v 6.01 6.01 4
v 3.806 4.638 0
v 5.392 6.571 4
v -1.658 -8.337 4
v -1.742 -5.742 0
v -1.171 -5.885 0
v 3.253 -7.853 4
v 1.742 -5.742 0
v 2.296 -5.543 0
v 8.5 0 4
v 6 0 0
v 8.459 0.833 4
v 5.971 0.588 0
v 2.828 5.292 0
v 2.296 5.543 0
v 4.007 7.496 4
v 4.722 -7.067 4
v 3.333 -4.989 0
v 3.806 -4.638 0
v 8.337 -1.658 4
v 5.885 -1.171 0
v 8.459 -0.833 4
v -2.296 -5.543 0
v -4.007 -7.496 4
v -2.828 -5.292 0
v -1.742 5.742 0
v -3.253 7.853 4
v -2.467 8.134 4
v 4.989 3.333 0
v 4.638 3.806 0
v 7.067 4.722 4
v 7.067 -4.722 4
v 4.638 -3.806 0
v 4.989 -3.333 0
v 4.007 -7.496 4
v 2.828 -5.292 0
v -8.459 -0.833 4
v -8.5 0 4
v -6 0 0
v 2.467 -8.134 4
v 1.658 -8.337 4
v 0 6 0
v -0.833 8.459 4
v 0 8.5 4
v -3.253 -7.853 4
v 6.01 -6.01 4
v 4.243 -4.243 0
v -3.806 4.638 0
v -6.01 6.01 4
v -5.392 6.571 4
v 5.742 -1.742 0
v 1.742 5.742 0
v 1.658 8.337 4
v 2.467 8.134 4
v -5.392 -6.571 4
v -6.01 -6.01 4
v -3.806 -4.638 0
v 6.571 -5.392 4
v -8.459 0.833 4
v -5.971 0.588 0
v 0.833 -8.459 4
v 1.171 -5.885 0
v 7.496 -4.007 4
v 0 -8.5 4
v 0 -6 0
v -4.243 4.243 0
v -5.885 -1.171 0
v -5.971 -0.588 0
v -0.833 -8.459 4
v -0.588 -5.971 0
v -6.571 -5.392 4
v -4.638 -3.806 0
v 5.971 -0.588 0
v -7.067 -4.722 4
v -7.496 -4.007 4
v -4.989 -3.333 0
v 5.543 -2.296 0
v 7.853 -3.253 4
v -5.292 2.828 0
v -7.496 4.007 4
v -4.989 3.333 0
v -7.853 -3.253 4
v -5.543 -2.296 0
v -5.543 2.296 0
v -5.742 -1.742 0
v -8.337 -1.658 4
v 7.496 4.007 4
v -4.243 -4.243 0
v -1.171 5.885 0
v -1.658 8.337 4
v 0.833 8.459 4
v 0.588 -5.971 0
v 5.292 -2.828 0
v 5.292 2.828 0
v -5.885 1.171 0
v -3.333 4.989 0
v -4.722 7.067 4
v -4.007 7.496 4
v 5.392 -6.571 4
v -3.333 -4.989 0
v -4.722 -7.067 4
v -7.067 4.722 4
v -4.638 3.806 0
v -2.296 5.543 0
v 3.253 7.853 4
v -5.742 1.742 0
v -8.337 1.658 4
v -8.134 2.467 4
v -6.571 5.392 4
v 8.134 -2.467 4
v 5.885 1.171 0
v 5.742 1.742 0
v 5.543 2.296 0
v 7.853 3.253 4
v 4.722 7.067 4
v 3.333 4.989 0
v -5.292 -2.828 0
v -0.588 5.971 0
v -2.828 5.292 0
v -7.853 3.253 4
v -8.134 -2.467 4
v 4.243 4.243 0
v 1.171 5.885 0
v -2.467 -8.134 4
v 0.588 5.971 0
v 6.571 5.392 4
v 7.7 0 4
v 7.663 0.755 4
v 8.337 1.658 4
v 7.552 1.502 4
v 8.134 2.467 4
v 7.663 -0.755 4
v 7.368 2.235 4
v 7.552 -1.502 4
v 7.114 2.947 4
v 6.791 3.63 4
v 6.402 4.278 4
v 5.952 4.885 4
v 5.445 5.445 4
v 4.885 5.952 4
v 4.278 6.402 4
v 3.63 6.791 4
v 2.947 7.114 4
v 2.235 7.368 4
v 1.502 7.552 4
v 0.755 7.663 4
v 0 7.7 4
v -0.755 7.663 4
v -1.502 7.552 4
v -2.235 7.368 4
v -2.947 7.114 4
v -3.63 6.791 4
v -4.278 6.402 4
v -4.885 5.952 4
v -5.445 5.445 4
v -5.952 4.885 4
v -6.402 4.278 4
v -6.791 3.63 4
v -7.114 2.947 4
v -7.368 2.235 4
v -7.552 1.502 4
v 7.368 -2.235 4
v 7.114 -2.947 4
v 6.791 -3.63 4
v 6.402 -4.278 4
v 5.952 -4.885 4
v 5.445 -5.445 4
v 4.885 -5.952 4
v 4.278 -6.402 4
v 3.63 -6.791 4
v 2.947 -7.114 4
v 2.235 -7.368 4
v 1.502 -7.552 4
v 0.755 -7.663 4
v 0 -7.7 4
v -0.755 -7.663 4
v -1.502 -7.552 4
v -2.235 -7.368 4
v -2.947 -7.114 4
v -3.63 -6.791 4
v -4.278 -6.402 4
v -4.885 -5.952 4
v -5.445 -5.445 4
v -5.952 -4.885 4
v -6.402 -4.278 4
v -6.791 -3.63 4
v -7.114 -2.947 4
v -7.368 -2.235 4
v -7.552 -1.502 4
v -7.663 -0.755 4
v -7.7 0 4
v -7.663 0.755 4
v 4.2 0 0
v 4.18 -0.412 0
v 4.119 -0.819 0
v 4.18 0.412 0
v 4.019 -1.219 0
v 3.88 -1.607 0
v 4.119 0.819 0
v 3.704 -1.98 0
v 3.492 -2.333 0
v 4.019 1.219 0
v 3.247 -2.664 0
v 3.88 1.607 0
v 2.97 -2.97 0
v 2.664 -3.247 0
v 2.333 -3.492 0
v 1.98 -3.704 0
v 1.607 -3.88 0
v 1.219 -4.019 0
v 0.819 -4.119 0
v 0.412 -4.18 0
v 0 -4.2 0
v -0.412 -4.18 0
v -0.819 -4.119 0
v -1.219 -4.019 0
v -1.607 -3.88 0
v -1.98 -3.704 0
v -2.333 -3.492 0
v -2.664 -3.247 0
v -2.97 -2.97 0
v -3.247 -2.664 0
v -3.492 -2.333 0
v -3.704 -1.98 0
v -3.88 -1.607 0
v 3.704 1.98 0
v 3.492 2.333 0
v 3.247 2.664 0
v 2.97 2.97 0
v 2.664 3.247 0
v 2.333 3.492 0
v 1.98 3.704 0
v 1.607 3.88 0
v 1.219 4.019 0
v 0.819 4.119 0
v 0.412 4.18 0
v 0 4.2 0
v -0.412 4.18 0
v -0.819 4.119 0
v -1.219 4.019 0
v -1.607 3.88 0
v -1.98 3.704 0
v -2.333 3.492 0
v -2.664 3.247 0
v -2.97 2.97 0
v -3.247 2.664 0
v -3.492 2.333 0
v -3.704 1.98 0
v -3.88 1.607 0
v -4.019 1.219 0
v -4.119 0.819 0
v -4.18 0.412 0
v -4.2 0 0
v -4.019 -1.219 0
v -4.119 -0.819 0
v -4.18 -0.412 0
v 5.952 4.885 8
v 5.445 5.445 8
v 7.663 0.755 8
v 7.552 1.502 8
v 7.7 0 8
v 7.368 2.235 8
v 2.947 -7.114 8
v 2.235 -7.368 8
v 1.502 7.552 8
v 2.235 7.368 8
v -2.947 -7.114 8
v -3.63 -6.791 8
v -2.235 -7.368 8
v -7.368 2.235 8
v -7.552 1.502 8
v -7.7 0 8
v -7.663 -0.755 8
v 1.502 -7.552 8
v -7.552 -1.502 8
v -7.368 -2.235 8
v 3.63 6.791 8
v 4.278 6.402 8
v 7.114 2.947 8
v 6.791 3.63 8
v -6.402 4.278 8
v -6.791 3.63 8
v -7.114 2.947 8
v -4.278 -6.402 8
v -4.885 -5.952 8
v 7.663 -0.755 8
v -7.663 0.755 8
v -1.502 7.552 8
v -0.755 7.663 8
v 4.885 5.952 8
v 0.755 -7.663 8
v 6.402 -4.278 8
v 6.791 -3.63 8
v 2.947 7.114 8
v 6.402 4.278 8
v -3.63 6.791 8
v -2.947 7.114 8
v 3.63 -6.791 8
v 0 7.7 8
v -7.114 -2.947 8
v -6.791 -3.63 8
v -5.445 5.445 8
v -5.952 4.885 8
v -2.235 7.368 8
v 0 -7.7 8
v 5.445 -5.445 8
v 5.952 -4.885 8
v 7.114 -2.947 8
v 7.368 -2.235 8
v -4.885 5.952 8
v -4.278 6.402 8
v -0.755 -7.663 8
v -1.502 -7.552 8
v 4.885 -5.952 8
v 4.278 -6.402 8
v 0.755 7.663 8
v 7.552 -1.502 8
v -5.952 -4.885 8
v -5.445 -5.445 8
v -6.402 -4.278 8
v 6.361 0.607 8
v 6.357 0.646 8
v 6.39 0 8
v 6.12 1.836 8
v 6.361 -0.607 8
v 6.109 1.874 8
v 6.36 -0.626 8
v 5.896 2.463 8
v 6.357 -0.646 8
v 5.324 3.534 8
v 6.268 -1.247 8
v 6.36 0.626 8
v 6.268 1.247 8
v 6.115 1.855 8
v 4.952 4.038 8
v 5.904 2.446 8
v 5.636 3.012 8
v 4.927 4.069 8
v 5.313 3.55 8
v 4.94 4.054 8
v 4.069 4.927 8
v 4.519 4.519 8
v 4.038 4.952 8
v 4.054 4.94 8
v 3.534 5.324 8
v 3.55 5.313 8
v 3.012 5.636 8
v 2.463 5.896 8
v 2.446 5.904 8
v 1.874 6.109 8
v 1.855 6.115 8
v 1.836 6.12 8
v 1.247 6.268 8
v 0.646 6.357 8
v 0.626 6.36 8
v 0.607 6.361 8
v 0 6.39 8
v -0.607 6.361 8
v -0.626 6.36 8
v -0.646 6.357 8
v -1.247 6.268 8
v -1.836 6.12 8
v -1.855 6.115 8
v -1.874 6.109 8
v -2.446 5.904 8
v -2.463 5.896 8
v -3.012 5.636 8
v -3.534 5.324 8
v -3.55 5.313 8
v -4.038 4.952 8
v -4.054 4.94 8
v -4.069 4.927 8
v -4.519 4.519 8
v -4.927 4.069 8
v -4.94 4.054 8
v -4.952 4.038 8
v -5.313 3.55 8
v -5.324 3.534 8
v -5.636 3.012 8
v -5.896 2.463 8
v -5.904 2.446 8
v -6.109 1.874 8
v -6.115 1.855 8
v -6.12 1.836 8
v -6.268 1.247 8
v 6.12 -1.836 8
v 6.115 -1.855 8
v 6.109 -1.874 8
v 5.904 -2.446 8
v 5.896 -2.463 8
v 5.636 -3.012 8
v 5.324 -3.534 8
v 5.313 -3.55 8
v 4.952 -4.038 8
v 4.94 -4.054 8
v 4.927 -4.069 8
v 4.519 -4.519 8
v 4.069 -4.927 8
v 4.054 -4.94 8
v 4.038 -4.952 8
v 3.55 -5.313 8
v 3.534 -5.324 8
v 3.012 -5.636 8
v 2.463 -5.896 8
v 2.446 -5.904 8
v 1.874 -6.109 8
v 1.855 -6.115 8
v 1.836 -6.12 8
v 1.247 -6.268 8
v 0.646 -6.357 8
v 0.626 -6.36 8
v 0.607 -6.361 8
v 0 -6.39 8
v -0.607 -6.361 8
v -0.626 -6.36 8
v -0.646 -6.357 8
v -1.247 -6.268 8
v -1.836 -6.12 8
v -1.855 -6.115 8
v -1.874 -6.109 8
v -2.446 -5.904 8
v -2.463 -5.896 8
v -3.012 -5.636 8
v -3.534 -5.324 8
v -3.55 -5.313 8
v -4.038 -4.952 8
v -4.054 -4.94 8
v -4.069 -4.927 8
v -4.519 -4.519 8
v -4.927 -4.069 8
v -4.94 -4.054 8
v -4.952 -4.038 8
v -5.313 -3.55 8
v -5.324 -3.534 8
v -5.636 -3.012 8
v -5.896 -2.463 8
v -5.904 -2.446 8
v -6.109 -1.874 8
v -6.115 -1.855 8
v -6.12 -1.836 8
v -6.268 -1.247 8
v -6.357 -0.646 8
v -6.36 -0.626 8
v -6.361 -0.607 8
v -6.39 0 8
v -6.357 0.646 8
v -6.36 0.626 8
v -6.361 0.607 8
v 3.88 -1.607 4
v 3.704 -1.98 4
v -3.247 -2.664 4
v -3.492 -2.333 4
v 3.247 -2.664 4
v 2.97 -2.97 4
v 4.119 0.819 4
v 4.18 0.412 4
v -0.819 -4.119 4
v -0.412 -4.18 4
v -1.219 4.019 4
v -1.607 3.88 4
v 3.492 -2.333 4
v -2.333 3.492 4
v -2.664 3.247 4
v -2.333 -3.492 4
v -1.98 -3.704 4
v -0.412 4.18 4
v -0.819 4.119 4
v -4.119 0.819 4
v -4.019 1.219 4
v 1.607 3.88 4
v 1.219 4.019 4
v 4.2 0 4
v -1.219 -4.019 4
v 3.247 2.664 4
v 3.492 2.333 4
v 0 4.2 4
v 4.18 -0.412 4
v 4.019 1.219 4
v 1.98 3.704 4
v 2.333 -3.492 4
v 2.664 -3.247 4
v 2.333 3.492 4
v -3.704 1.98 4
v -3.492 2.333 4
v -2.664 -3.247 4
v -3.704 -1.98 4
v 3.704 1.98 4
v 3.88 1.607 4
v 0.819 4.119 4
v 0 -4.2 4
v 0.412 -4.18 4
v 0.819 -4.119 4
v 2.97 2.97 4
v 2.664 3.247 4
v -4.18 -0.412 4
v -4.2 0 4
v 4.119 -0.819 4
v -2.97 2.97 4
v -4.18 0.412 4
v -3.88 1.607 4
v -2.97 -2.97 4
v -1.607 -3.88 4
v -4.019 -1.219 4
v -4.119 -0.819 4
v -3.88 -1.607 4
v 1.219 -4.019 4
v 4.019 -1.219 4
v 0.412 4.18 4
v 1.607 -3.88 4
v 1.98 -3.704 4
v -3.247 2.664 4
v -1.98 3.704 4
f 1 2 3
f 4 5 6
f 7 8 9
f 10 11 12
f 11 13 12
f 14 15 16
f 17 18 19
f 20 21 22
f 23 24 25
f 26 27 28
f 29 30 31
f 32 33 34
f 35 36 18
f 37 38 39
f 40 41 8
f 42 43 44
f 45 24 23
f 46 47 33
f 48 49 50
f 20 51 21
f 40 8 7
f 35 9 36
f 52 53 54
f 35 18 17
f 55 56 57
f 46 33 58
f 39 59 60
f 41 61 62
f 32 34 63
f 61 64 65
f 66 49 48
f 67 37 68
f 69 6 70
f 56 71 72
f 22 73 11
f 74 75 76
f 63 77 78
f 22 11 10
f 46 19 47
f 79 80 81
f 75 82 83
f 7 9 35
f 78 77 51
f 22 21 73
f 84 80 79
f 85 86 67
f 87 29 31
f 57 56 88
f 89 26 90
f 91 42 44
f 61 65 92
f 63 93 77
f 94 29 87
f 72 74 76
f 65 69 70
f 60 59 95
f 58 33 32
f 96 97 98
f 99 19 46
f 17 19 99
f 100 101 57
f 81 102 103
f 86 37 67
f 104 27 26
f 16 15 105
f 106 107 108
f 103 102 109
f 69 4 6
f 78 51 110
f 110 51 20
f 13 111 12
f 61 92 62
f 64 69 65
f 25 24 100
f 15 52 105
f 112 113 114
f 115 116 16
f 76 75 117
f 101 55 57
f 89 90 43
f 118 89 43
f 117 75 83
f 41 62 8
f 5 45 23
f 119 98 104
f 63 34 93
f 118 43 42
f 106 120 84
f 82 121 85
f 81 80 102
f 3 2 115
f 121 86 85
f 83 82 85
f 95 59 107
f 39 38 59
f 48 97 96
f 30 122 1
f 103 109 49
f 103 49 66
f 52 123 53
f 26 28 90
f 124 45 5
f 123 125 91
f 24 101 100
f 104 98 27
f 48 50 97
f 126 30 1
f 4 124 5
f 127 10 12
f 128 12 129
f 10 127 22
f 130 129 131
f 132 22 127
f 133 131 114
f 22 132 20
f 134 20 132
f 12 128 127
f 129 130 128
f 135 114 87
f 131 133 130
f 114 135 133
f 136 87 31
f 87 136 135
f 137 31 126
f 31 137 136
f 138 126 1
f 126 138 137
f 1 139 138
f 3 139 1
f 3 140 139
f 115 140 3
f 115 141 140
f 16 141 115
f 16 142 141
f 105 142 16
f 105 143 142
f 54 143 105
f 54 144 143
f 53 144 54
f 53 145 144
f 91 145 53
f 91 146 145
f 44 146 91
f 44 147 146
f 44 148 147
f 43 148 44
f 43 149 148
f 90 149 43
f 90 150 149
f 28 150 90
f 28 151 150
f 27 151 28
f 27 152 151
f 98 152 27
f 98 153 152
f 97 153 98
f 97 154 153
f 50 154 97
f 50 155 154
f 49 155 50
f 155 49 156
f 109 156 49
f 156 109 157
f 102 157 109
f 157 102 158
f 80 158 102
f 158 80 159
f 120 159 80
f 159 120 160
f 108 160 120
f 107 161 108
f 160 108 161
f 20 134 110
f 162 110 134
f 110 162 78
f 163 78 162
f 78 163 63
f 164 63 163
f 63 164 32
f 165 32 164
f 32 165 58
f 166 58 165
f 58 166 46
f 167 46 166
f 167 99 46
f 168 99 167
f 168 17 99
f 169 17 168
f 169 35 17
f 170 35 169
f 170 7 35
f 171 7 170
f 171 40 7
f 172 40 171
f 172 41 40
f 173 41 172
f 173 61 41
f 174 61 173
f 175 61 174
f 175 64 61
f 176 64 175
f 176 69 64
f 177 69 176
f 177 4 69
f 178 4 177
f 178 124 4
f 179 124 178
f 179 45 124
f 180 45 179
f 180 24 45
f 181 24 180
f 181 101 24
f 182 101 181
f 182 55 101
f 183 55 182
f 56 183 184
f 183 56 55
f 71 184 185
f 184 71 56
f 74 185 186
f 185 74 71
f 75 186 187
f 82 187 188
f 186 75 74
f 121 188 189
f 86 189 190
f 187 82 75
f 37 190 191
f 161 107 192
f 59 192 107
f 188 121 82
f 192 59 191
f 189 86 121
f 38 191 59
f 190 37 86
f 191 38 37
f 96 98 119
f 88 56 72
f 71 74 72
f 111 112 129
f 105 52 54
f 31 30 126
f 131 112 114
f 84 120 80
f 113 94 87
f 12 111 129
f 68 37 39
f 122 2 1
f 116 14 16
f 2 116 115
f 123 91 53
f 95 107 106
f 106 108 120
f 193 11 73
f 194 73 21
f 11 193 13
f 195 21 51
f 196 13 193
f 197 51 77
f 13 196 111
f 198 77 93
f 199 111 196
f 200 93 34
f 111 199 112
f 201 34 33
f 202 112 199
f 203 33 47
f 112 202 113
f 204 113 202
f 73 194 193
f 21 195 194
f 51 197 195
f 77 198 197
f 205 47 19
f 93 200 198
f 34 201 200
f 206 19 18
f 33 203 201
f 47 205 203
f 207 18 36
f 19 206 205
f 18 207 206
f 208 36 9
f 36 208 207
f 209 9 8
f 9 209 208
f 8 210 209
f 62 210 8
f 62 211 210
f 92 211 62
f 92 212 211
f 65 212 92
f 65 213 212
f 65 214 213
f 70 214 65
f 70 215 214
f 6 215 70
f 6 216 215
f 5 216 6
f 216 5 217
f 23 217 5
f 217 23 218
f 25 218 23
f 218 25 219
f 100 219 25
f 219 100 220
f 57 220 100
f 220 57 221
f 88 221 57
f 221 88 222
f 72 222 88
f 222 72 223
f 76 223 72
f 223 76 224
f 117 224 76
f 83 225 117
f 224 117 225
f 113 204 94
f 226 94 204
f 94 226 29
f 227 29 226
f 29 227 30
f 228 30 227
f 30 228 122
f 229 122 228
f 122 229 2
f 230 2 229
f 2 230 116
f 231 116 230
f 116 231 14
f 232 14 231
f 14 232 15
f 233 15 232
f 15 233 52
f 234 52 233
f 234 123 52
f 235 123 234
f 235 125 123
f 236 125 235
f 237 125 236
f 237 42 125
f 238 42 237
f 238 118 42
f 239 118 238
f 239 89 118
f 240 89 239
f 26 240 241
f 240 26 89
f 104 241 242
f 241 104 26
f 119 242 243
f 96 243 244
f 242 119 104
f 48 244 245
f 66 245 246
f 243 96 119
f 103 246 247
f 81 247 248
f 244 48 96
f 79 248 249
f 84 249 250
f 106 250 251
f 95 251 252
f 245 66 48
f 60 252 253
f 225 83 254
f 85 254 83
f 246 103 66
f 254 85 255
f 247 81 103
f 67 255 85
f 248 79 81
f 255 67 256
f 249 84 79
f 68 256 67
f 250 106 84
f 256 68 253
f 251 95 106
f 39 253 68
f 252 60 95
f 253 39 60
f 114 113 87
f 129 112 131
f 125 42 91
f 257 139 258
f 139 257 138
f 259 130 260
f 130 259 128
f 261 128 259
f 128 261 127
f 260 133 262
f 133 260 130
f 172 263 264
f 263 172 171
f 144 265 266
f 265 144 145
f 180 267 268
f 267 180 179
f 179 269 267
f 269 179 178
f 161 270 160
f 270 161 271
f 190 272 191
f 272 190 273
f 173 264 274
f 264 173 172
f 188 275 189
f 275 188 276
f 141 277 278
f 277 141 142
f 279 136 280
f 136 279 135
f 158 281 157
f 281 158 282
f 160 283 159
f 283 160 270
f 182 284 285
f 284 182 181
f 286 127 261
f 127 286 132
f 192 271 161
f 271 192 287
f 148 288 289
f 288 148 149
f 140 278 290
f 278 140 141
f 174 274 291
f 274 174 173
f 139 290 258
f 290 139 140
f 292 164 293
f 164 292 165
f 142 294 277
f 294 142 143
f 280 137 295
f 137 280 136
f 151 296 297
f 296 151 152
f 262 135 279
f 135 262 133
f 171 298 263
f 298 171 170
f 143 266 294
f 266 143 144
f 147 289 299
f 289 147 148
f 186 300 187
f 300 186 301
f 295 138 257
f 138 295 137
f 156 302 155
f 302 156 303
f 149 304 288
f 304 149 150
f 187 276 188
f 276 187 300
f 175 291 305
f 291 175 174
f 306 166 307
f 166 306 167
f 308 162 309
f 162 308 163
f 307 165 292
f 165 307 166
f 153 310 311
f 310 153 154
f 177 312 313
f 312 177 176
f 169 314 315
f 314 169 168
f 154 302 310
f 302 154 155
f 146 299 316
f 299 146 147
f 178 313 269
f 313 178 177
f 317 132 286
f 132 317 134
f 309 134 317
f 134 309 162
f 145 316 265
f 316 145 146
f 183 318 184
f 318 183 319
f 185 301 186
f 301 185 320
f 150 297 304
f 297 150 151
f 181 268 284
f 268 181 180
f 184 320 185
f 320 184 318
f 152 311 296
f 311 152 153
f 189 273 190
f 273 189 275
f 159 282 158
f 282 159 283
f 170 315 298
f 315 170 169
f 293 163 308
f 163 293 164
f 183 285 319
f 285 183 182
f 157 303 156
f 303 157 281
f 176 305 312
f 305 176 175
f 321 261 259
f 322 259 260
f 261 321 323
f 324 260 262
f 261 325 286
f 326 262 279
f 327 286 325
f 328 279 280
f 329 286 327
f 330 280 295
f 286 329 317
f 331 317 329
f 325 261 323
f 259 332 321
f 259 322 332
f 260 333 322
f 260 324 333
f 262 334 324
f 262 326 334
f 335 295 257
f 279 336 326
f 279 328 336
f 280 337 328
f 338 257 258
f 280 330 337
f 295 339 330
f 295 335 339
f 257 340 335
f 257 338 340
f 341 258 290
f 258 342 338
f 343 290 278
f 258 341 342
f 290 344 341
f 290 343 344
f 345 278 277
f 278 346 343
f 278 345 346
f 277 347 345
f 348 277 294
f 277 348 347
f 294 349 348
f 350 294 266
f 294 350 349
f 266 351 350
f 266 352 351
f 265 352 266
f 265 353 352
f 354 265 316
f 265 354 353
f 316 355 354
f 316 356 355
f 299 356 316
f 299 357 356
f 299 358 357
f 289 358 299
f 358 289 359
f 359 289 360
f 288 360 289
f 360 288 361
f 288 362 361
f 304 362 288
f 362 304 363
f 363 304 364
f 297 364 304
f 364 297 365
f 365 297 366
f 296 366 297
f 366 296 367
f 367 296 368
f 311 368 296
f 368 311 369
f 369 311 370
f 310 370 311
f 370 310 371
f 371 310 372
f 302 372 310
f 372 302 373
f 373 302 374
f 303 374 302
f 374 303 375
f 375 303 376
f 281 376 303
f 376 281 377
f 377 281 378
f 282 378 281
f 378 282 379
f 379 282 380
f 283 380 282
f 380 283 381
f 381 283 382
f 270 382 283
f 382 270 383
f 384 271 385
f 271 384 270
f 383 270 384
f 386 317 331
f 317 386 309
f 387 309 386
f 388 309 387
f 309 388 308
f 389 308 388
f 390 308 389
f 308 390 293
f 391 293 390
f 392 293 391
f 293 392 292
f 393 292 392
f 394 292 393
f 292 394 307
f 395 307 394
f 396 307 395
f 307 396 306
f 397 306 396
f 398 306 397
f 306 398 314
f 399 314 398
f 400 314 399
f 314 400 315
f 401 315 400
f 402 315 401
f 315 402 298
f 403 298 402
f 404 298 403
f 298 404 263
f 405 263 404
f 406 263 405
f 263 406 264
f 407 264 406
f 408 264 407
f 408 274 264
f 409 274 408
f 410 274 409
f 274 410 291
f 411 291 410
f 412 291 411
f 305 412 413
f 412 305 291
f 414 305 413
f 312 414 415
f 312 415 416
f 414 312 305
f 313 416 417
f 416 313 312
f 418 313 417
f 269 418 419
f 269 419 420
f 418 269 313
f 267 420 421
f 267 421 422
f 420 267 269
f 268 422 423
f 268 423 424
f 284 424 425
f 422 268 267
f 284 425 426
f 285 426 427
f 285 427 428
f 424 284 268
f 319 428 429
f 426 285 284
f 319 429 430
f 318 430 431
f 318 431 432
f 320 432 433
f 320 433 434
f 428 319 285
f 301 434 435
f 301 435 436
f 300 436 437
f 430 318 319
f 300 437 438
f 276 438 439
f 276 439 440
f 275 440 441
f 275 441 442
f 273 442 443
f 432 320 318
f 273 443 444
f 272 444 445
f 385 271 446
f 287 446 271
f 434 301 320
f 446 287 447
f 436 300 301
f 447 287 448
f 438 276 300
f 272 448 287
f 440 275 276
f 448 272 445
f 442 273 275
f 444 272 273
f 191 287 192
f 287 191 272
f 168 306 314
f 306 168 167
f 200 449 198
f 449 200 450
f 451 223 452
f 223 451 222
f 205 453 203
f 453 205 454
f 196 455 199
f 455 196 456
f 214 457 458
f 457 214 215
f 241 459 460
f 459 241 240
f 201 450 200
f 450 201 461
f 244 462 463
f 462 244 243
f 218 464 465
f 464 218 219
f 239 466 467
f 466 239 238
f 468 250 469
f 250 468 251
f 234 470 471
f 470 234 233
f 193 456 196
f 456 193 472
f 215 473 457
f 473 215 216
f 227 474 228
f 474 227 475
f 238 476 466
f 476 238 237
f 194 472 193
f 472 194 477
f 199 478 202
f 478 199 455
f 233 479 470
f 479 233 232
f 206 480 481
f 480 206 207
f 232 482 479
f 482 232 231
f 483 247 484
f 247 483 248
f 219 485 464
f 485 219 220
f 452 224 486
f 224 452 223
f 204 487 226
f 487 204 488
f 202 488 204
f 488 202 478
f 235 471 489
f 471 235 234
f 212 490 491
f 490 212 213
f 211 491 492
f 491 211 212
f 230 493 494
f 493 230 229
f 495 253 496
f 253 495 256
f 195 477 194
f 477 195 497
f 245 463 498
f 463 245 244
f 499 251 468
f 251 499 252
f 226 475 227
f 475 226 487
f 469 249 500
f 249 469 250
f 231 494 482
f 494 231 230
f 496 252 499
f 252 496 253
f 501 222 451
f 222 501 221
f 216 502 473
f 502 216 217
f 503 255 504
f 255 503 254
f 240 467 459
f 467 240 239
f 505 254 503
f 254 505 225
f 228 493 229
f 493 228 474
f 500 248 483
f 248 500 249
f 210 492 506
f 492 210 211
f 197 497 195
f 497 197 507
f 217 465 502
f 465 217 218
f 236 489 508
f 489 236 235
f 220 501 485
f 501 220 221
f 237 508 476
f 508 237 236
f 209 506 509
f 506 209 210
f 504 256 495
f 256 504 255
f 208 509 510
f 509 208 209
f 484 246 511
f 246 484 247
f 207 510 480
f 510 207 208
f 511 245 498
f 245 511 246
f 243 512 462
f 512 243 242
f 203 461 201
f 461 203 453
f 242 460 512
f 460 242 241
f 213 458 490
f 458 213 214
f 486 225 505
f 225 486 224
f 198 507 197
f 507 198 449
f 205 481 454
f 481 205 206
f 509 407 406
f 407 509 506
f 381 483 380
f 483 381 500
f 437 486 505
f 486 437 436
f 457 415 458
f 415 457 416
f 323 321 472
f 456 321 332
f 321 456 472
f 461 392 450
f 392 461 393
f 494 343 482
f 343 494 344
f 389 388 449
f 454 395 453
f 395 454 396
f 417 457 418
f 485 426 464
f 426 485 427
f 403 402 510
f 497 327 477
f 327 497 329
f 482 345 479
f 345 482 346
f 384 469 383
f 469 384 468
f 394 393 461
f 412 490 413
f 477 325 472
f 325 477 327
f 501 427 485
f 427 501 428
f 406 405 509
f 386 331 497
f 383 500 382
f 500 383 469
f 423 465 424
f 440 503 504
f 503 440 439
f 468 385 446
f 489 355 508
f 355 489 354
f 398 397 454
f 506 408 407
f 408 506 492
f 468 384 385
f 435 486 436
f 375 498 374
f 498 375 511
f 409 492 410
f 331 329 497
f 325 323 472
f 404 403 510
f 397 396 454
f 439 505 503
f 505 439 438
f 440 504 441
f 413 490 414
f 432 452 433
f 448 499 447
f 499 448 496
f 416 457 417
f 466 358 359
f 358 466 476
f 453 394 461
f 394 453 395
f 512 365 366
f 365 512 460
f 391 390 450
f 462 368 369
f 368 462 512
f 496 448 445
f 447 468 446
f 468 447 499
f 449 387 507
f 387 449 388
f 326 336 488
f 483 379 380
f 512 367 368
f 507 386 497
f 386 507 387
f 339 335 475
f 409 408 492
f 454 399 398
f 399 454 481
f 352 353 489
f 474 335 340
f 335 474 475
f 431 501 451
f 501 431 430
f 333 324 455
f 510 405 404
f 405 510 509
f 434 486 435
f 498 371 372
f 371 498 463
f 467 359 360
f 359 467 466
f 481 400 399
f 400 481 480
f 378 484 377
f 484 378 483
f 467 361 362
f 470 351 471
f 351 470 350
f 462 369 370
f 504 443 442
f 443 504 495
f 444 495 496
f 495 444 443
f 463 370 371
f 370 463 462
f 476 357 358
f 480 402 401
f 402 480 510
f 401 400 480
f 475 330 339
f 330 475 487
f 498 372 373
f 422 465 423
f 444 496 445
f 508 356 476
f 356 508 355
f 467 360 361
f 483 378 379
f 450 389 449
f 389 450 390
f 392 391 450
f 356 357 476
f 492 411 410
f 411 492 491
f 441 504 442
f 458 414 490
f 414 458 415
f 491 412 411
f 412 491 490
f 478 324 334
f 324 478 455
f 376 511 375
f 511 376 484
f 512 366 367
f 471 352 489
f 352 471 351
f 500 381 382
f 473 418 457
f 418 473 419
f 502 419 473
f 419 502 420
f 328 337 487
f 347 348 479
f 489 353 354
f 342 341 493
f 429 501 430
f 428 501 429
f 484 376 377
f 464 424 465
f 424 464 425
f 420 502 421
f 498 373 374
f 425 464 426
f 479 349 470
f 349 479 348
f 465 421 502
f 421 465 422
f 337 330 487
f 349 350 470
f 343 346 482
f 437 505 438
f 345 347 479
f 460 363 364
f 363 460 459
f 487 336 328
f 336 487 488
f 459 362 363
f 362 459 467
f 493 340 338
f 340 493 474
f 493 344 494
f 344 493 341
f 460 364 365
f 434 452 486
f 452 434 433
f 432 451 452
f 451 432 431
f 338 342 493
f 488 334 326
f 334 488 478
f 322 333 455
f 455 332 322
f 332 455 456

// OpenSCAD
$fn=64;
difference(){
    union() {
        cylinder(d1=12, d2=17, h=4);
        translate([0, 0, 4]) cylinder(d=15.4, h=4);
    }
    union() {
        d=8.4;
        translate([0,0,-.1])cylinder(d=d, h=4.2);
        translate([0, 0, 4]) cylinder(d1=d, d2=13, h=4.2);
    }
}
